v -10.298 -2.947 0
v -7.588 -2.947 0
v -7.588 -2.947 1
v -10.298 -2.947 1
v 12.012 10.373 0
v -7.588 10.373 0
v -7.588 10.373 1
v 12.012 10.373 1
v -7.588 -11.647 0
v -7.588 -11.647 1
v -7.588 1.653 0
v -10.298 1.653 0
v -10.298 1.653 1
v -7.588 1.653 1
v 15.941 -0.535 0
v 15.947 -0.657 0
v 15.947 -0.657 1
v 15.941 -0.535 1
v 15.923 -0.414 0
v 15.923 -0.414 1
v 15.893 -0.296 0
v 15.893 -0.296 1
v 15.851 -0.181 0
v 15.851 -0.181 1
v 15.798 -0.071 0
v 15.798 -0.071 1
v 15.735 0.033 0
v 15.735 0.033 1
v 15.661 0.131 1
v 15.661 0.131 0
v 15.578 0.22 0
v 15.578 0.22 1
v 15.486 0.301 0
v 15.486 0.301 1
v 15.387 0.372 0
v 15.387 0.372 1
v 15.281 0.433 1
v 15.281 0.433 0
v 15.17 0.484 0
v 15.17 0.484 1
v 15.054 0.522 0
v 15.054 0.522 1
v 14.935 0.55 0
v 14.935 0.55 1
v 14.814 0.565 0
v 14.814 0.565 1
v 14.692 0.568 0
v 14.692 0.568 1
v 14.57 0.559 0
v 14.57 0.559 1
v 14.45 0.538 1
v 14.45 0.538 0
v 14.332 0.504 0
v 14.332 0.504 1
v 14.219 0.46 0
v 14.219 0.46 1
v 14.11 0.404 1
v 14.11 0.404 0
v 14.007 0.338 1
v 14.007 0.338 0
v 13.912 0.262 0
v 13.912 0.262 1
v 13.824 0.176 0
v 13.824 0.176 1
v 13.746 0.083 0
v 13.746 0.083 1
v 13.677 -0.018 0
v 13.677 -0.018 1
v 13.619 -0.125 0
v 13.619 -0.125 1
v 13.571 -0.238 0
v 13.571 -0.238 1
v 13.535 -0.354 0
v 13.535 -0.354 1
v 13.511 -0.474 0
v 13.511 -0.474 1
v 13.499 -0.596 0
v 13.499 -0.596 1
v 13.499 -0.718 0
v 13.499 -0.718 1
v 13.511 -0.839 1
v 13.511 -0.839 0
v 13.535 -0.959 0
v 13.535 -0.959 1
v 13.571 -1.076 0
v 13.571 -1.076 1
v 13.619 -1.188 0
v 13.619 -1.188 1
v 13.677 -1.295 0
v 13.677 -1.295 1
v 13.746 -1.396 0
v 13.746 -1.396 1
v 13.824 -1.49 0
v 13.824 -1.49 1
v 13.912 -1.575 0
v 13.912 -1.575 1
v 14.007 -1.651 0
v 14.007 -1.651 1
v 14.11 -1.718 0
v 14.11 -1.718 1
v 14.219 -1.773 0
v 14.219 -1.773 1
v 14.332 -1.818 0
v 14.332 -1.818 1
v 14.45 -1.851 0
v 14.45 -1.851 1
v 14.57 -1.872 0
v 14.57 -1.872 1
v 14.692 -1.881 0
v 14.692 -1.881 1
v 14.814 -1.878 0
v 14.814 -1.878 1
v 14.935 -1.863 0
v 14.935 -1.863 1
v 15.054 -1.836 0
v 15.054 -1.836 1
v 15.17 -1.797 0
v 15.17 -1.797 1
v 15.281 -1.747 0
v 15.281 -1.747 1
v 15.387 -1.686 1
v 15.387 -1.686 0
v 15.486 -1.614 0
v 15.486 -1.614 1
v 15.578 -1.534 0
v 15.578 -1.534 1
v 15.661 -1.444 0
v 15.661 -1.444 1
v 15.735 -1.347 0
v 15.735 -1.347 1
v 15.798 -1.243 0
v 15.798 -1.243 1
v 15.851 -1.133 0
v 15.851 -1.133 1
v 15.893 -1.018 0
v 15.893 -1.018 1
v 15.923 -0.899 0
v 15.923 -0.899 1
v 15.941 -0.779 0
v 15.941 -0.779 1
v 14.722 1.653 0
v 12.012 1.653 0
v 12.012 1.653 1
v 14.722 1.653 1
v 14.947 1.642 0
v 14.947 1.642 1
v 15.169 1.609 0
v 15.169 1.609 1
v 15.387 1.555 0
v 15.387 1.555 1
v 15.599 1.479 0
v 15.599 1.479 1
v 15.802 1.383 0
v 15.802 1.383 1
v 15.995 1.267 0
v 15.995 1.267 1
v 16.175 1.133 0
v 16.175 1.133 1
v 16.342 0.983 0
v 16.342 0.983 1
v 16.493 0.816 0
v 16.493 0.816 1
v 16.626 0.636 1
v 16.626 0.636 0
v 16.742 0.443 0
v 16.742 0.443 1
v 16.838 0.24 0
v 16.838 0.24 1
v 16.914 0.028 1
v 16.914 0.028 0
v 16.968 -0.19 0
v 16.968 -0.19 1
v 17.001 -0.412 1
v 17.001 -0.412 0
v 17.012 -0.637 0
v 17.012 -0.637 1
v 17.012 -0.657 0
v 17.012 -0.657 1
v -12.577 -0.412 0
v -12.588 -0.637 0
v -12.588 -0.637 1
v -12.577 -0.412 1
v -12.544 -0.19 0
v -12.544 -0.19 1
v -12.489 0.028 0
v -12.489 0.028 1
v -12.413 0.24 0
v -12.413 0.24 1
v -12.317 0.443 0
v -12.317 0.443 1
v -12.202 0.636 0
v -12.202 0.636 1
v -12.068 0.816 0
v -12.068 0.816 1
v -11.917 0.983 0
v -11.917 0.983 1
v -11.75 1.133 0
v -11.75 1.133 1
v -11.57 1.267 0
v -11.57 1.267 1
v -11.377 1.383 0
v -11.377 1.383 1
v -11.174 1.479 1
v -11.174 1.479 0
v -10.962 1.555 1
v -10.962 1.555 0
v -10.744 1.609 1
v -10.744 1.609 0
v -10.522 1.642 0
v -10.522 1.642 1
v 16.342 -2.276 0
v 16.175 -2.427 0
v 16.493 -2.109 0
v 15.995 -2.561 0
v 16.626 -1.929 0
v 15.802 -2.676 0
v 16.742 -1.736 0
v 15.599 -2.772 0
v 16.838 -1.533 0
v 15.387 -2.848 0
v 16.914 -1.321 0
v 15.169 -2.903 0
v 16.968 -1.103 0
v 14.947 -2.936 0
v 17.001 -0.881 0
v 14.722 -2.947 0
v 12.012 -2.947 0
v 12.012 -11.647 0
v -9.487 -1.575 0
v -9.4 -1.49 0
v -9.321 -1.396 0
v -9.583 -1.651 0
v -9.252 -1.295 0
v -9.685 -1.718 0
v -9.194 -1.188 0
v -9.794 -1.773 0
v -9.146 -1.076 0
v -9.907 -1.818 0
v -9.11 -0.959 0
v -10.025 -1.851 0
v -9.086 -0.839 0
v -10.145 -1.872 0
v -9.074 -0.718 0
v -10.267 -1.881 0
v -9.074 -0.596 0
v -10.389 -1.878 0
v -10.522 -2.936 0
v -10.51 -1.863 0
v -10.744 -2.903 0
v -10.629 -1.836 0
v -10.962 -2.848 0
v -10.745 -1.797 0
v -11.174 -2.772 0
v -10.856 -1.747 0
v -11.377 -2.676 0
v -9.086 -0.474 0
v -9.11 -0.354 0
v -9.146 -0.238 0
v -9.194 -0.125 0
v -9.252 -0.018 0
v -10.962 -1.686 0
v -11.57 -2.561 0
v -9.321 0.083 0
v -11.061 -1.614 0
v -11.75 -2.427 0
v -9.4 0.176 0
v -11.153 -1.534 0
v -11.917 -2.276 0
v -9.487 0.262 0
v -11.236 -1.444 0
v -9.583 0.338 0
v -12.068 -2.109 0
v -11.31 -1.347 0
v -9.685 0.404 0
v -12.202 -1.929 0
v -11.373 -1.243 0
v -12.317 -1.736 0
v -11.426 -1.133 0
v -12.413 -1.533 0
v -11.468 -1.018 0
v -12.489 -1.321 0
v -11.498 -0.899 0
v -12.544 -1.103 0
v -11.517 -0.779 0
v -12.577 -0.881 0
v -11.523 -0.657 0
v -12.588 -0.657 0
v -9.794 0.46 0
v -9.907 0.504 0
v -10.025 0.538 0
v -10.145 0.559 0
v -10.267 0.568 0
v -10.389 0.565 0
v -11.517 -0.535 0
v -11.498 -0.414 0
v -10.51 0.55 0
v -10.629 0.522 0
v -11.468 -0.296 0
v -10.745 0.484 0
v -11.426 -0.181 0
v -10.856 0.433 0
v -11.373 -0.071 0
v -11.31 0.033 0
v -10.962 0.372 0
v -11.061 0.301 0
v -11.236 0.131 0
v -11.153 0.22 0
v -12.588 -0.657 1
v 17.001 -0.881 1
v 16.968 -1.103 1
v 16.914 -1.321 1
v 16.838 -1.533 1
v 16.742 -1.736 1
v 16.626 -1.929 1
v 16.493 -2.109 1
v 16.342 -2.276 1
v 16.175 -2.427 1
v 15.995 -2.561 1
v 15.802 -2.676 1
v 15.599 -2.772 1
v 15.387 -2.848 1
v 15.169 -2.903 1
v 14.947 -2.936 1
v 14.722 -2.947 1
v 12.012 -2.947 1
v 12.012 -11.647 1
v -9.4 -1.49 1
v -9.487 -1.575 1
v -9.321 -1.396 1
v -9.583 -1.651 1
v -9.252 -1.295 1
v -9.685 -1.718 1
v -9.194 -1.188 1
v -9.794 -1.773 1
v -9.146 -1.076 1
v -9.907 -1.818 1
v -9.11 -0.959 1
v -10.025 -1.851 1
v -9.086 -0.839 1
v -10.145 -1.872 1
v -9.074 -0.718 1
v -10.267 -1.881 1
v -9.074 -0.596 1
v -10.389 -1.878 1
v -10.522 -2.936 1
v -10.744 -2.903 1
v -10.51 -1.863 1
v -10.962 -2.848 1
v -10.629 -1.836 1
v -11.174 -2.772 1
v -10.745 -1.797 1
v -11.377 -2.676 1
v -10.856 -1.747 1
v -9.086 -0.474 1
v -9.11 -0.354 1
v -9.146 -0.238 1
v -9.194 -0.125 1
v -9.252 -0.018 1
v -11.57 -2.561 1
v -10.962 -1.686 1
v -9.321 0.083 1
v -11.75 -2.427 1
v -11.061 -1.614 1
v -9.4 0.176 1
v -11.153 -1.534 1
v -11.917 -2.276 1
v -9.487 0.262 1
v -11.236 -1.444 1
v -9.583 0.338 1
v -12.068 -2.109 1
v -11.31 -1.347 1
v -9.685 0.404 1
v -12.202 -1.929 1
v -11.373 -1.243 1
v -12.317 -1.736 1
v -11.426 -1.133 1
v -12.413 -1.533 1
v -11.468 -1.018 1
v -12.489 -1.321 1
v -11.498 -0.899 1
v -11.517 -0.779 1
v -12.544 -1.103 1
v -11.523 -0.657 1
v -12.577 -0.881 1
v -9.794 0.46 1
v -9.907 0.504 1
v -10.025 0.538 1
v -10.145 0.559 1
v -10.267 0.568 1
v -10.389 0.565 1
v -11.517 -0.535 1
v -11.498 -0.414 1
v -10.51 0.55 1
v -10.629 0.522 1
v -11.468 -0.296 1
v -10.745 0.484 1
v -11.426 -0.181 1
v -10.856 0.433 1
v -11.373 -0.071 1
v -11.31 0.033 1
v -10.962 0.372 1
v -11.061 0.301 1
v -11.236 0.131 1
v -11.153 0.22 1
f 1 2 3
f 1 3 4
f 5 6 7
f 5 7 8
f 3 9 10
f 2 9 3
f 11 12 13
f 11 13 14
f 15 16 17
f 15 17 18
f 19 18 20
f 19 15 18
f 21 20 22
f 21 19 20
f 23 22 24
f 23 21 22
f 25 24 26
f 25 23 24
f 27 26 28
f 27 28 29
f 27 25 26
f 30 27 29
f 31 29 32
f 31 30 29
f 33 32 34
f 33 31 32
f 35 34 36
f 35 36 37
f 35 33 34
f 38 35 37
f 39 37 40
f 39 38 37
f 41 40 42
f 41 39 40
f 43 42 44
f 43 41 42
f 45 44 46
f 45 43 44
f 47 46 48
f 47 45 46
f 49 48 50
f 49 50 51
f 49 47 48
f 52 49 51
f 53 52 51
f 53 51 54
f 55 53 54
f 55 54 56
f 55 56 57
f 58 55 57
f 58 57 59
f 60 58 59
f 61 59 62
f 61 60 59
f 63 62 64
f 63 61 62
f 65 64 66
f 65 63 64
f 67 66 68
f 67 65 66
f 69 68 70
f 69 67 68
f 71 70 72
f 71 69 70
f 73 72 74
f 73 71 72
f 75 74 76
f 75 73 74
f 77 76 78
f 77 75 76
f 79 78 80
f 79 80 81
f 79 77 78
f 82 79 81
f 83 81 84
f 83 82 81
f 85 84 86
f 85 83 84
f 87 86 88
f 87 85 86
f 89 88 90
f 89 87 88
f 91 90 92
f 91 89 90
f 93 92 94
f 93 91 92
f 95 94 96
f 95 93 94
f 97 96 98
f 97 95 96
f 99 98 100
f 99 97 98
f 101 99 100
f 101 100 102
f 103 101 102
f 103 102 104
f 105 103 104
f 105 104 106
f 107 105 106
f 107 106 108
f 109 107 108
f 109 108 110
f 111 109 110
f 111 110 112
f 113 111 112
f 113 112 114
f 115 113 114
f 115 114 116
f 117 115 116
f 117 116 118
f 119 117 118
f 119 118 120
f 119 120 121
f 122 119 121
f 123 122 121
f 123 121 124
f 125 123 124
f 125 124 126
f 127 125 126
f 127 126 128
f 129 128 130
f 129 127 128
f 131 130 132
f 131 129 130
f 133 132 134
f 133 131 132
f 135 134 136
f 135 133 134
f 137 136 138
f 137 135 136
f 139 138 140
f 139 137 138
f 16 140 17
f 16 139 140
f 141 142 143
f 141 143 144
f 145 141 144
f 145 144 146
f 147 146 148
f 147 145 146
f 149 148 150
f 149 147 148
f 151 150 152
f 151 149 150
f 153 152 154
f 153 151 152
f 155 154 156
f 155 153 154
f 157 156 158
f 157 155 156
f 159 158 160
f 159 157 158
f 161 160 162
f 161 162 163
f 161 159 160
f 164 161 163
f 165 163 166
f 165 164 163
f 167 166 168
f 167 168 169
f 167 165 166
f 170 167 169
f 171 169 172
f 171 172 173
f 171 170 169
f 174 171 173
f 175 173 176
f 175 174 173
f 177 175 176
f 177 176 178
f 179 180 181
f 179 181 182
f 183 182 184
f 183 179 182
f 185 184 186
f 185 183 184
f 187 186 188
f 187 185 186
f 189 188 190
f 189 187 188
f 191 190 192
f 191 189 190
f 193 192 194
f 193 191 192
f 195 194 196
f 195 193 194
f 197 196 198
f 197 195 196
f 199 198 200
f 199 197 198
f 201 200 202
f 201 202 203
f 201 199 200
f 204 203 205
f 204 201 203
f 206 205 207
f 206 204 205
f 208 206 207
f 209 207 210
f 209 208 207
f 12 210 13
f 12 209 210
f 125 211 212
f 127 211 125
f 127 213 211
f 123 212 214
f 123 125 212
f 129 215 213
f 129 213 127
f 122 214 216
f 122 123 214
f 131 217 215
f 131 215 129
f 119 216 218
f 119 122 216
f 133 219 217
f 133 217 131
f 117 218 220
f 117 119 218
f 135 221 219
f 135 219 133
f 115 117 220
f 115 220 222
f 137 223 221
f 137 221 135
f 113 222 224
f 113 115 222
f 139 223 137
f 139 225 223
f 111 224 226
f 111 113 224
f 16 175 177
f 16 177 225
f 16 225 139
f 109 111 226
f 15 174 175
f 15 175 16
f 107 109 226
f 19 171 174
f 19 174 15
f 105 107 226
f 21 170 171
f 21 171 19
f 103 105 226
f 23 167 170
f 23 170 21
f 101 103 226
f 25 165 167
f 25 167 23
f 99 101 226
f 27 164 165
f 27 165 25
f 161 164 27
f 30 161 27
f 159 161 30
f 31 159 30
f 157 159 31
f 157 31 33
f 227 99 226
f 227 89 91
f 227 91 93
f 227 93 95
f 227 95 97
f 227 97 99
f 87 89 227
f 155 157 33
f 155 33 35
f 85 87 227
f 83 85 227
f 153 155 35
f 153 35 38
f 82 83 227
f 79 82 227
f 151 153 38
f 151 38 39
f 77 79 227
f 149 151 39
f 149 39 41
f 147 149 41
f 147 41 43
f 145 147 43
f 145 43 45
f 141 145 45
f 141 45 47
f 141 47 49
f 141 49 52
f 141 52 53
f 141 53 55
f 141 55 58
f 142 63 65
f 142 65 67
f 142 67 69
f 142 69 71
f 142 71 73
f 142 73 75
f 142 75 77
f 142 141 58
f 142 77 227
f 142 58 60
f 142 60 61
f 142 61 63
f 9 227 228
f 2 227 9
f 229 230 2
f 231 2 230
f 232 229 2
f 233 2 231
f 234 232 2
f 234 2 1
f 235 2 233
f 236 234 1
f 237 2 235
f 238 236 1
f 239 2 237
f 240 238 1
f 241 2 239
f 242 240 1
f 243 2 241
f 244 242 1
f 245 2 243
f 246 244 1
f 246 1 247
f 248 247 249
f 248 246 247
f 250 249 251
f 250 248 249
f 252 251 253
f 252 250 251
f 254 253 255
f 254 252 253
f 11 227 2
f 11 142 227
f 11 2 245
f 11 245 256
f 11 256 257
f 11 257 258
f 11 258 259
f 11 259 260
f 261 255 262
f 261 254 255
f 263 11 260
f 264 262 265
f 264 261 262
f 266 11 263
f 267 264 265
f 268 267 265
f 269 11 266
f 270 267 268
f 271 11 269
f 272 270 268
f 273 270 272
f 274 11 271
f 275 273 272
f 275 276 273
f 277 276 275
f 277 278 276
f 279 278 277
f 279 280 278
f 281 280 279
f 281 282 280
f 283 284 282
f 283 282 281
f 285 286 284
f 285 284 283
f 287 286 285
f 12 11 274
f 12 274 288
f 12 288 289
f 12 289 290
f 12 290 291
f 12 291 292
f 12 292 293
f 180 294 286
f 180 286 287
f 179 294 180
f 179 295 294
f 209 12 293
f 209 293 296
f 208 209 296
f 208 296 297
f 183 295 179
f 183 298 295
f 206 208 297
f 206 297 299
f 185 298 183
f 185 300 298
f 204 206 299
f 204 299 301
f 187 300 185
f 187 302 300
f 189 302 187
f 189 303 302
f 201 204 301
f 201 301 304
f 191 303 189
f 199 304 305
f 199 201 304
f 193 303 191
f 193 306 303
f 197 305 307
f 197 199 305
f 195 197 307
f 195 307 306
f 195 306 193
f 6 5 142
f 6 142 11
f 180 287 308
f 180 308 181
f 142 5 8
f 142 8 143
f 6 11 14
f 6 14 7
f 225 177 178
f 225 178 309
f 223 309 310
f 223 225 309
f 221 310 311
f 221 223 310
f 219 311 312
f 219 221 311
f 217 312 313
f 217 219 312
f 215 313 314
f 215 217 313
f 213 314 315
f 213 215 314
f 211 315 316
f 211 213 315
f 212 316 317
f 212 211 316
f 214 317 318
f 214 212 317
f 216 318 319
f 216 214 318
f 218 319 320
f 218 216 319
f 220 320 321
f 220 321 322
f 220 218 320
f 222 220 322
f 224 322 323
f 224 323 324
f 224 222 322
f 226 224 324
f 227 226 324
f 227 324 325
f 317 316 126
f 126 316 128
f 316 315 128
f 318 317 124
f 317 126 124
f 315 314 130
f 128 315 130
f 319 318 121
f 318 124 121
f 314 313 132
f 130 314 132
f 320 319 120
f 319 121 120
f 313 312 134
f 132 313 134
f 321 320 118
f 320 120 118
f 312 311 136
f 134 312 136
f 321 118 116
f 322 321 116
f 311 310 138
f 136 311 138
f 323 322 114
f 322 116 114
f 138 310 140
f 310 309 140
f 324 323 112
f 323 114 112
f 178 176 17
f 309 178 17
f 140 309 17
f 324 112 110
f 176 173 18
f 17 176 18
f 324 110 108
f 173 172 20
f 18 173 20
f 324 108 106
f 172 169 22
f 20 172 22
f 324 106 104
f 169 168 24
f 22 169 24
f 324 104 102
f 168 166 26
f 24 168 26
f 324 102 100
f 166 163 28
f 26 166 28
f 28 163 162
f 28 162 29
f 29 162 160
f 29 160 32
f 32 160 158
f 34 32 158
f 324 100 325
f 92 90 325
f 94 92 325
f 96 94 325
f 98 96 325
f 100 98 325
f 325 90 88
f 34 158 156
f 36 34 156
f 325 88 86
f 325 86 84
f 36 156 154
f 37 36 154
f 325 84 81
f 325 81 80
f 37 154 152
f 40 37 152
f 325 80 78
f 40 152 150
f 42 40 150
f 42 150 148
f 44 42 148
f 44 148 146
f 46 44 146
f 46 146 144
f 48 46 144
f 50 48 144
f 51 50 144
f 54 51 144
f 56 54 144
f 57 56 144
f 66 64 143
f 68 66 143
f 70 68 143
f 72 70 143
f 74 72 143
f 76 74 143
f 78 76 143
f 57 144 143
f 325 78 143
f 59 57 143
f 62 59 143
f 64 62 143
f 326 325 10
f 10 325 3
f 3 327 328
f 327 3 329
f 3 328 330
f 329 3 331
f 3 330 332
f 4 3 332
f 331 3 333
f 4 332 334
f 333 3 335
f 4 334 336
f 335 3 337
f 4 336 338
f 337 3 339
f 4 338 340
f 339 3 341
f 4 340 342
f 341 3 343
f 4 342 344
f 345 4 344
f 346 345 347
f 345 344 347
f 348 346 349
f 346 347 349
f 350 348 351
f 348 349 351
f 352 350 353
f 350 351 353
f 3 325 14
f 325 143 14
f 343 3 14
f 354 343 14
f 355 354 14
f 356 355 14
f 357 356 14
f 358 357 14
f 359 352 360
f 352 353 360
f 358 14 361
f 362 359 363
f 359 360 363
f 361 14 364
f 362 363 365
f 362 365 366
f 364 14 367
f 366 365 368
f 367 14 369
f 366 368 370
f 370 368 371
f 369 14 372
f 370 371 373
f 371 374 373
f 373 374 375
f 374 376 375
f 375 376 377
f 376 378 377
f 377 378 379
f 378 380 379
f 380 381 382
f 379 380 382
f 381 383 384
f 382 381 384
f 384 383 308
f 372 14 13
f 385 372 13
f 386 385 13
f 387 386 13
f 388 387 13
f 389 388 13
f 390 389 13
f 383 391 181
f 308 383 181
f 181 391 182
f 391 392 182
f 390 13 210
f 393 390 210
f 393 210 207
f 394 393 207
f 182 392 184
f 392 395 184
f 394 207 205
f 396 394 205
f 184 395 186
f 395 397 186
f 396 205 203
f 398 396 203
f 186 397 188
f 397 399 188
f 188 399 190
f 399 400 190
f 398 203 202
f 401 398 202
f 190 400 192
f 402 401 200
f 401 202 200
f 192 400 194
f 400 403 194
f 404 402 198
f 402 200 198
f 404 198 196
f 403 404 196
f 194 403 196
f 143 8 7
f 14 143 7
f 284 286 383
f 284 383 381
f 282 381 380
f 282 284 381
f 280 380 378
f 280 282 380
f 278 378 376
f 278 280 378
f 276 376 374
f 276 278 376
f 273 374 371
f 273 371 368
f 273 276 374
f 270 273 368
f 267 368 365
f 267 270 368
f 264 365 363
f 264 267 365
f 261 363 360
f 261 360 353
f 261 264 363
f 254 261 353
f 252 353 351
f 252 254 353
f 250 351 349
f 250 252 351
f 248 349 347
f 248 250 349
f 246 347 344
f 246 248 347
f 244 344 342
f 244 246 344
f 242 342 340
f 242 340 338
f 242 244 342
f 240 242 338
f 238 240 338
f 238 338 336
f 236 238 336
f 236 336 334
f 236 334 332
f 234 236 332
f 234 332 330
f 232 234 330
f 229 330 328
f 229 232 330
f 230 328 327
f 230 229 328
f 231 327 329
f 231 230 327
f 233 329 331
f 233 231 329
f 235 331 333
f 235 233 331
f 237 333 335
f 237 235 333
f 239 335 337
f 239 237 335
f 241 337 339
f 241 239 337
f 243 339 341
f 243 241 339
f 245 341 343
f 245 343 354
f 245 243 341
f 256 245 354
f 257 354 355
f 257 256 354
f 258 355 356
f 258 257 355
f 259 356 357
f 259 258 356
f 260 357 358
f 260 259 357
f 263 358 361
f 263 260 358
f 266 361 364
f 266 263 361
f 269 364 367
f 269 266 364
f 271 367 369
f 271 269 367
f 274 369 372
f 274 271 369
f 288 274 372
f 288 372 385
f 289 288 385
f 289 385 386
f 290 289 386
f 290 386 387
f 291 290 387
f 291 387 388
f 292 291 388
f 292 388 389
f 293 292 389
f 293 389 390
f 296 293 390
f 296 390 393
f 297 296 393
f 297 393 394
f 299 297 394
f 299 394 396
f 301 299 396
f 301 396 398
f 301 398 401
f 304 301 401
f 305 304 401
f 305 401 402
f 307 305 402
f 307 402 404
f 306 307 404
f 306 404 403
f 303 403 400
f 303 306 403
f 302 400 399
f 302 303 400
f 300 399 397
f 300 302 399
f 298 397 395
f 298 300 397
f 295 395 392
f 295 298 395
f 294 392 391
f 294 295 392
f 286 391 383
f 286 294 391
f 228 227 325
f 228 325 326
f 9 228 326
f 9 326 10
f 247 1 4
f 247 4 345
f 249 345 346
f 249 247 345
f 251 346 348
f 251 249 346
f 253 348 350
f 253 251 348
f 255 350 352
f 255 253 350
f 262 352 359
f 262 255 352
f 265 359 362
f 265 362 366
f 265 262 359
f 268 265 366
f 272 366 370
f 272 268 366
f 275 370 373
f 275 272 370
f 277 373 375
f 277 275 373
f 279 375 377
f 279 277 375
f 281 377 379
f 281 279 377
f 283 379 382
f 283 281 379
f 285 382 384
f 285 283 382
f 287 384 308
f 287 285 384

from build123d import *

# Parameters (mm, degrees)
SZKIC1_R                    = 1.225
DODANIE_WYCI_GNI_CIE1_DEPTH = 1


with BuildPart() as part:
    # Szkic1 → Dodanie-wyciągnięcie1 (new body)
    with BuildSketch(Plane.XY):
        with BuildLine():
            Line((-7.587614458, 10.373277108), (12.012385542, 10.373277108))
            Line((12.012385542, 10.373277108), (12.012385542, 1.653277108))
            Line((12.012385542, 1.653277108), (14.722385542, 1.653277108))
            ThreePointArc((14.722385542, 1.653277108), (16.341660071, 0.982551637), (17.012385542, -0.636722892))
            Line((17.012385542, -0.636722892), (17.012385542, -0.656722892))
            ThreePointArc((17.012385542, -0.656722892), (16.341660071, -2.27599742), (14.722385542, -2.946722892))
            Line((14.722385542, -2.946722892), (12.012385542, -2.946722892))
            Line((12.012385542, -2.946722892), (12.012385542, -11.646722892))
            Line((12.012385542, -11.646722892), (-7.587614458, -11.646722892))
            Line((-7.587614458, -11.646722892), (-7.587614458, -2.946722892))
            Line((-7.587614458, -2.946722892), (-10.297614458, -2.946722892))
            ThreePointArc((-10.297614458, -2.946722892), (-11.916888987, -2.27599742), (-12.587614458, -0.656722892))
            Line((-12.587614458, -0.656722892), (-12.587614458, -0.636722892))
            ThreePointArc((-12.587614458, -0.636722892), (-11.916888987, 0.982551637), (-10.297614458, 1.653277108))
            Line((-10.297614458, 1.653277108), (-7.587614458, 1.653277108))
            Line((-7.587614458, 1.653277108), (-7.587614458, 10.373277108))
        make_face()
        with Locations((14.722385542, -0.656722892)):
            Circle(SZKIC1_R, mode=Mode.SUBTRACT)
        with Locations(Location((-10.297614458, -0.656722892, 0), (0, 0, 180))):
            Circle(SZKIC1_R, mode=Mode.SUBTRACT)
    extrude(amount=DODANIE_WYCI_GNI_CIE1_DEPTH)


solid = part.part
